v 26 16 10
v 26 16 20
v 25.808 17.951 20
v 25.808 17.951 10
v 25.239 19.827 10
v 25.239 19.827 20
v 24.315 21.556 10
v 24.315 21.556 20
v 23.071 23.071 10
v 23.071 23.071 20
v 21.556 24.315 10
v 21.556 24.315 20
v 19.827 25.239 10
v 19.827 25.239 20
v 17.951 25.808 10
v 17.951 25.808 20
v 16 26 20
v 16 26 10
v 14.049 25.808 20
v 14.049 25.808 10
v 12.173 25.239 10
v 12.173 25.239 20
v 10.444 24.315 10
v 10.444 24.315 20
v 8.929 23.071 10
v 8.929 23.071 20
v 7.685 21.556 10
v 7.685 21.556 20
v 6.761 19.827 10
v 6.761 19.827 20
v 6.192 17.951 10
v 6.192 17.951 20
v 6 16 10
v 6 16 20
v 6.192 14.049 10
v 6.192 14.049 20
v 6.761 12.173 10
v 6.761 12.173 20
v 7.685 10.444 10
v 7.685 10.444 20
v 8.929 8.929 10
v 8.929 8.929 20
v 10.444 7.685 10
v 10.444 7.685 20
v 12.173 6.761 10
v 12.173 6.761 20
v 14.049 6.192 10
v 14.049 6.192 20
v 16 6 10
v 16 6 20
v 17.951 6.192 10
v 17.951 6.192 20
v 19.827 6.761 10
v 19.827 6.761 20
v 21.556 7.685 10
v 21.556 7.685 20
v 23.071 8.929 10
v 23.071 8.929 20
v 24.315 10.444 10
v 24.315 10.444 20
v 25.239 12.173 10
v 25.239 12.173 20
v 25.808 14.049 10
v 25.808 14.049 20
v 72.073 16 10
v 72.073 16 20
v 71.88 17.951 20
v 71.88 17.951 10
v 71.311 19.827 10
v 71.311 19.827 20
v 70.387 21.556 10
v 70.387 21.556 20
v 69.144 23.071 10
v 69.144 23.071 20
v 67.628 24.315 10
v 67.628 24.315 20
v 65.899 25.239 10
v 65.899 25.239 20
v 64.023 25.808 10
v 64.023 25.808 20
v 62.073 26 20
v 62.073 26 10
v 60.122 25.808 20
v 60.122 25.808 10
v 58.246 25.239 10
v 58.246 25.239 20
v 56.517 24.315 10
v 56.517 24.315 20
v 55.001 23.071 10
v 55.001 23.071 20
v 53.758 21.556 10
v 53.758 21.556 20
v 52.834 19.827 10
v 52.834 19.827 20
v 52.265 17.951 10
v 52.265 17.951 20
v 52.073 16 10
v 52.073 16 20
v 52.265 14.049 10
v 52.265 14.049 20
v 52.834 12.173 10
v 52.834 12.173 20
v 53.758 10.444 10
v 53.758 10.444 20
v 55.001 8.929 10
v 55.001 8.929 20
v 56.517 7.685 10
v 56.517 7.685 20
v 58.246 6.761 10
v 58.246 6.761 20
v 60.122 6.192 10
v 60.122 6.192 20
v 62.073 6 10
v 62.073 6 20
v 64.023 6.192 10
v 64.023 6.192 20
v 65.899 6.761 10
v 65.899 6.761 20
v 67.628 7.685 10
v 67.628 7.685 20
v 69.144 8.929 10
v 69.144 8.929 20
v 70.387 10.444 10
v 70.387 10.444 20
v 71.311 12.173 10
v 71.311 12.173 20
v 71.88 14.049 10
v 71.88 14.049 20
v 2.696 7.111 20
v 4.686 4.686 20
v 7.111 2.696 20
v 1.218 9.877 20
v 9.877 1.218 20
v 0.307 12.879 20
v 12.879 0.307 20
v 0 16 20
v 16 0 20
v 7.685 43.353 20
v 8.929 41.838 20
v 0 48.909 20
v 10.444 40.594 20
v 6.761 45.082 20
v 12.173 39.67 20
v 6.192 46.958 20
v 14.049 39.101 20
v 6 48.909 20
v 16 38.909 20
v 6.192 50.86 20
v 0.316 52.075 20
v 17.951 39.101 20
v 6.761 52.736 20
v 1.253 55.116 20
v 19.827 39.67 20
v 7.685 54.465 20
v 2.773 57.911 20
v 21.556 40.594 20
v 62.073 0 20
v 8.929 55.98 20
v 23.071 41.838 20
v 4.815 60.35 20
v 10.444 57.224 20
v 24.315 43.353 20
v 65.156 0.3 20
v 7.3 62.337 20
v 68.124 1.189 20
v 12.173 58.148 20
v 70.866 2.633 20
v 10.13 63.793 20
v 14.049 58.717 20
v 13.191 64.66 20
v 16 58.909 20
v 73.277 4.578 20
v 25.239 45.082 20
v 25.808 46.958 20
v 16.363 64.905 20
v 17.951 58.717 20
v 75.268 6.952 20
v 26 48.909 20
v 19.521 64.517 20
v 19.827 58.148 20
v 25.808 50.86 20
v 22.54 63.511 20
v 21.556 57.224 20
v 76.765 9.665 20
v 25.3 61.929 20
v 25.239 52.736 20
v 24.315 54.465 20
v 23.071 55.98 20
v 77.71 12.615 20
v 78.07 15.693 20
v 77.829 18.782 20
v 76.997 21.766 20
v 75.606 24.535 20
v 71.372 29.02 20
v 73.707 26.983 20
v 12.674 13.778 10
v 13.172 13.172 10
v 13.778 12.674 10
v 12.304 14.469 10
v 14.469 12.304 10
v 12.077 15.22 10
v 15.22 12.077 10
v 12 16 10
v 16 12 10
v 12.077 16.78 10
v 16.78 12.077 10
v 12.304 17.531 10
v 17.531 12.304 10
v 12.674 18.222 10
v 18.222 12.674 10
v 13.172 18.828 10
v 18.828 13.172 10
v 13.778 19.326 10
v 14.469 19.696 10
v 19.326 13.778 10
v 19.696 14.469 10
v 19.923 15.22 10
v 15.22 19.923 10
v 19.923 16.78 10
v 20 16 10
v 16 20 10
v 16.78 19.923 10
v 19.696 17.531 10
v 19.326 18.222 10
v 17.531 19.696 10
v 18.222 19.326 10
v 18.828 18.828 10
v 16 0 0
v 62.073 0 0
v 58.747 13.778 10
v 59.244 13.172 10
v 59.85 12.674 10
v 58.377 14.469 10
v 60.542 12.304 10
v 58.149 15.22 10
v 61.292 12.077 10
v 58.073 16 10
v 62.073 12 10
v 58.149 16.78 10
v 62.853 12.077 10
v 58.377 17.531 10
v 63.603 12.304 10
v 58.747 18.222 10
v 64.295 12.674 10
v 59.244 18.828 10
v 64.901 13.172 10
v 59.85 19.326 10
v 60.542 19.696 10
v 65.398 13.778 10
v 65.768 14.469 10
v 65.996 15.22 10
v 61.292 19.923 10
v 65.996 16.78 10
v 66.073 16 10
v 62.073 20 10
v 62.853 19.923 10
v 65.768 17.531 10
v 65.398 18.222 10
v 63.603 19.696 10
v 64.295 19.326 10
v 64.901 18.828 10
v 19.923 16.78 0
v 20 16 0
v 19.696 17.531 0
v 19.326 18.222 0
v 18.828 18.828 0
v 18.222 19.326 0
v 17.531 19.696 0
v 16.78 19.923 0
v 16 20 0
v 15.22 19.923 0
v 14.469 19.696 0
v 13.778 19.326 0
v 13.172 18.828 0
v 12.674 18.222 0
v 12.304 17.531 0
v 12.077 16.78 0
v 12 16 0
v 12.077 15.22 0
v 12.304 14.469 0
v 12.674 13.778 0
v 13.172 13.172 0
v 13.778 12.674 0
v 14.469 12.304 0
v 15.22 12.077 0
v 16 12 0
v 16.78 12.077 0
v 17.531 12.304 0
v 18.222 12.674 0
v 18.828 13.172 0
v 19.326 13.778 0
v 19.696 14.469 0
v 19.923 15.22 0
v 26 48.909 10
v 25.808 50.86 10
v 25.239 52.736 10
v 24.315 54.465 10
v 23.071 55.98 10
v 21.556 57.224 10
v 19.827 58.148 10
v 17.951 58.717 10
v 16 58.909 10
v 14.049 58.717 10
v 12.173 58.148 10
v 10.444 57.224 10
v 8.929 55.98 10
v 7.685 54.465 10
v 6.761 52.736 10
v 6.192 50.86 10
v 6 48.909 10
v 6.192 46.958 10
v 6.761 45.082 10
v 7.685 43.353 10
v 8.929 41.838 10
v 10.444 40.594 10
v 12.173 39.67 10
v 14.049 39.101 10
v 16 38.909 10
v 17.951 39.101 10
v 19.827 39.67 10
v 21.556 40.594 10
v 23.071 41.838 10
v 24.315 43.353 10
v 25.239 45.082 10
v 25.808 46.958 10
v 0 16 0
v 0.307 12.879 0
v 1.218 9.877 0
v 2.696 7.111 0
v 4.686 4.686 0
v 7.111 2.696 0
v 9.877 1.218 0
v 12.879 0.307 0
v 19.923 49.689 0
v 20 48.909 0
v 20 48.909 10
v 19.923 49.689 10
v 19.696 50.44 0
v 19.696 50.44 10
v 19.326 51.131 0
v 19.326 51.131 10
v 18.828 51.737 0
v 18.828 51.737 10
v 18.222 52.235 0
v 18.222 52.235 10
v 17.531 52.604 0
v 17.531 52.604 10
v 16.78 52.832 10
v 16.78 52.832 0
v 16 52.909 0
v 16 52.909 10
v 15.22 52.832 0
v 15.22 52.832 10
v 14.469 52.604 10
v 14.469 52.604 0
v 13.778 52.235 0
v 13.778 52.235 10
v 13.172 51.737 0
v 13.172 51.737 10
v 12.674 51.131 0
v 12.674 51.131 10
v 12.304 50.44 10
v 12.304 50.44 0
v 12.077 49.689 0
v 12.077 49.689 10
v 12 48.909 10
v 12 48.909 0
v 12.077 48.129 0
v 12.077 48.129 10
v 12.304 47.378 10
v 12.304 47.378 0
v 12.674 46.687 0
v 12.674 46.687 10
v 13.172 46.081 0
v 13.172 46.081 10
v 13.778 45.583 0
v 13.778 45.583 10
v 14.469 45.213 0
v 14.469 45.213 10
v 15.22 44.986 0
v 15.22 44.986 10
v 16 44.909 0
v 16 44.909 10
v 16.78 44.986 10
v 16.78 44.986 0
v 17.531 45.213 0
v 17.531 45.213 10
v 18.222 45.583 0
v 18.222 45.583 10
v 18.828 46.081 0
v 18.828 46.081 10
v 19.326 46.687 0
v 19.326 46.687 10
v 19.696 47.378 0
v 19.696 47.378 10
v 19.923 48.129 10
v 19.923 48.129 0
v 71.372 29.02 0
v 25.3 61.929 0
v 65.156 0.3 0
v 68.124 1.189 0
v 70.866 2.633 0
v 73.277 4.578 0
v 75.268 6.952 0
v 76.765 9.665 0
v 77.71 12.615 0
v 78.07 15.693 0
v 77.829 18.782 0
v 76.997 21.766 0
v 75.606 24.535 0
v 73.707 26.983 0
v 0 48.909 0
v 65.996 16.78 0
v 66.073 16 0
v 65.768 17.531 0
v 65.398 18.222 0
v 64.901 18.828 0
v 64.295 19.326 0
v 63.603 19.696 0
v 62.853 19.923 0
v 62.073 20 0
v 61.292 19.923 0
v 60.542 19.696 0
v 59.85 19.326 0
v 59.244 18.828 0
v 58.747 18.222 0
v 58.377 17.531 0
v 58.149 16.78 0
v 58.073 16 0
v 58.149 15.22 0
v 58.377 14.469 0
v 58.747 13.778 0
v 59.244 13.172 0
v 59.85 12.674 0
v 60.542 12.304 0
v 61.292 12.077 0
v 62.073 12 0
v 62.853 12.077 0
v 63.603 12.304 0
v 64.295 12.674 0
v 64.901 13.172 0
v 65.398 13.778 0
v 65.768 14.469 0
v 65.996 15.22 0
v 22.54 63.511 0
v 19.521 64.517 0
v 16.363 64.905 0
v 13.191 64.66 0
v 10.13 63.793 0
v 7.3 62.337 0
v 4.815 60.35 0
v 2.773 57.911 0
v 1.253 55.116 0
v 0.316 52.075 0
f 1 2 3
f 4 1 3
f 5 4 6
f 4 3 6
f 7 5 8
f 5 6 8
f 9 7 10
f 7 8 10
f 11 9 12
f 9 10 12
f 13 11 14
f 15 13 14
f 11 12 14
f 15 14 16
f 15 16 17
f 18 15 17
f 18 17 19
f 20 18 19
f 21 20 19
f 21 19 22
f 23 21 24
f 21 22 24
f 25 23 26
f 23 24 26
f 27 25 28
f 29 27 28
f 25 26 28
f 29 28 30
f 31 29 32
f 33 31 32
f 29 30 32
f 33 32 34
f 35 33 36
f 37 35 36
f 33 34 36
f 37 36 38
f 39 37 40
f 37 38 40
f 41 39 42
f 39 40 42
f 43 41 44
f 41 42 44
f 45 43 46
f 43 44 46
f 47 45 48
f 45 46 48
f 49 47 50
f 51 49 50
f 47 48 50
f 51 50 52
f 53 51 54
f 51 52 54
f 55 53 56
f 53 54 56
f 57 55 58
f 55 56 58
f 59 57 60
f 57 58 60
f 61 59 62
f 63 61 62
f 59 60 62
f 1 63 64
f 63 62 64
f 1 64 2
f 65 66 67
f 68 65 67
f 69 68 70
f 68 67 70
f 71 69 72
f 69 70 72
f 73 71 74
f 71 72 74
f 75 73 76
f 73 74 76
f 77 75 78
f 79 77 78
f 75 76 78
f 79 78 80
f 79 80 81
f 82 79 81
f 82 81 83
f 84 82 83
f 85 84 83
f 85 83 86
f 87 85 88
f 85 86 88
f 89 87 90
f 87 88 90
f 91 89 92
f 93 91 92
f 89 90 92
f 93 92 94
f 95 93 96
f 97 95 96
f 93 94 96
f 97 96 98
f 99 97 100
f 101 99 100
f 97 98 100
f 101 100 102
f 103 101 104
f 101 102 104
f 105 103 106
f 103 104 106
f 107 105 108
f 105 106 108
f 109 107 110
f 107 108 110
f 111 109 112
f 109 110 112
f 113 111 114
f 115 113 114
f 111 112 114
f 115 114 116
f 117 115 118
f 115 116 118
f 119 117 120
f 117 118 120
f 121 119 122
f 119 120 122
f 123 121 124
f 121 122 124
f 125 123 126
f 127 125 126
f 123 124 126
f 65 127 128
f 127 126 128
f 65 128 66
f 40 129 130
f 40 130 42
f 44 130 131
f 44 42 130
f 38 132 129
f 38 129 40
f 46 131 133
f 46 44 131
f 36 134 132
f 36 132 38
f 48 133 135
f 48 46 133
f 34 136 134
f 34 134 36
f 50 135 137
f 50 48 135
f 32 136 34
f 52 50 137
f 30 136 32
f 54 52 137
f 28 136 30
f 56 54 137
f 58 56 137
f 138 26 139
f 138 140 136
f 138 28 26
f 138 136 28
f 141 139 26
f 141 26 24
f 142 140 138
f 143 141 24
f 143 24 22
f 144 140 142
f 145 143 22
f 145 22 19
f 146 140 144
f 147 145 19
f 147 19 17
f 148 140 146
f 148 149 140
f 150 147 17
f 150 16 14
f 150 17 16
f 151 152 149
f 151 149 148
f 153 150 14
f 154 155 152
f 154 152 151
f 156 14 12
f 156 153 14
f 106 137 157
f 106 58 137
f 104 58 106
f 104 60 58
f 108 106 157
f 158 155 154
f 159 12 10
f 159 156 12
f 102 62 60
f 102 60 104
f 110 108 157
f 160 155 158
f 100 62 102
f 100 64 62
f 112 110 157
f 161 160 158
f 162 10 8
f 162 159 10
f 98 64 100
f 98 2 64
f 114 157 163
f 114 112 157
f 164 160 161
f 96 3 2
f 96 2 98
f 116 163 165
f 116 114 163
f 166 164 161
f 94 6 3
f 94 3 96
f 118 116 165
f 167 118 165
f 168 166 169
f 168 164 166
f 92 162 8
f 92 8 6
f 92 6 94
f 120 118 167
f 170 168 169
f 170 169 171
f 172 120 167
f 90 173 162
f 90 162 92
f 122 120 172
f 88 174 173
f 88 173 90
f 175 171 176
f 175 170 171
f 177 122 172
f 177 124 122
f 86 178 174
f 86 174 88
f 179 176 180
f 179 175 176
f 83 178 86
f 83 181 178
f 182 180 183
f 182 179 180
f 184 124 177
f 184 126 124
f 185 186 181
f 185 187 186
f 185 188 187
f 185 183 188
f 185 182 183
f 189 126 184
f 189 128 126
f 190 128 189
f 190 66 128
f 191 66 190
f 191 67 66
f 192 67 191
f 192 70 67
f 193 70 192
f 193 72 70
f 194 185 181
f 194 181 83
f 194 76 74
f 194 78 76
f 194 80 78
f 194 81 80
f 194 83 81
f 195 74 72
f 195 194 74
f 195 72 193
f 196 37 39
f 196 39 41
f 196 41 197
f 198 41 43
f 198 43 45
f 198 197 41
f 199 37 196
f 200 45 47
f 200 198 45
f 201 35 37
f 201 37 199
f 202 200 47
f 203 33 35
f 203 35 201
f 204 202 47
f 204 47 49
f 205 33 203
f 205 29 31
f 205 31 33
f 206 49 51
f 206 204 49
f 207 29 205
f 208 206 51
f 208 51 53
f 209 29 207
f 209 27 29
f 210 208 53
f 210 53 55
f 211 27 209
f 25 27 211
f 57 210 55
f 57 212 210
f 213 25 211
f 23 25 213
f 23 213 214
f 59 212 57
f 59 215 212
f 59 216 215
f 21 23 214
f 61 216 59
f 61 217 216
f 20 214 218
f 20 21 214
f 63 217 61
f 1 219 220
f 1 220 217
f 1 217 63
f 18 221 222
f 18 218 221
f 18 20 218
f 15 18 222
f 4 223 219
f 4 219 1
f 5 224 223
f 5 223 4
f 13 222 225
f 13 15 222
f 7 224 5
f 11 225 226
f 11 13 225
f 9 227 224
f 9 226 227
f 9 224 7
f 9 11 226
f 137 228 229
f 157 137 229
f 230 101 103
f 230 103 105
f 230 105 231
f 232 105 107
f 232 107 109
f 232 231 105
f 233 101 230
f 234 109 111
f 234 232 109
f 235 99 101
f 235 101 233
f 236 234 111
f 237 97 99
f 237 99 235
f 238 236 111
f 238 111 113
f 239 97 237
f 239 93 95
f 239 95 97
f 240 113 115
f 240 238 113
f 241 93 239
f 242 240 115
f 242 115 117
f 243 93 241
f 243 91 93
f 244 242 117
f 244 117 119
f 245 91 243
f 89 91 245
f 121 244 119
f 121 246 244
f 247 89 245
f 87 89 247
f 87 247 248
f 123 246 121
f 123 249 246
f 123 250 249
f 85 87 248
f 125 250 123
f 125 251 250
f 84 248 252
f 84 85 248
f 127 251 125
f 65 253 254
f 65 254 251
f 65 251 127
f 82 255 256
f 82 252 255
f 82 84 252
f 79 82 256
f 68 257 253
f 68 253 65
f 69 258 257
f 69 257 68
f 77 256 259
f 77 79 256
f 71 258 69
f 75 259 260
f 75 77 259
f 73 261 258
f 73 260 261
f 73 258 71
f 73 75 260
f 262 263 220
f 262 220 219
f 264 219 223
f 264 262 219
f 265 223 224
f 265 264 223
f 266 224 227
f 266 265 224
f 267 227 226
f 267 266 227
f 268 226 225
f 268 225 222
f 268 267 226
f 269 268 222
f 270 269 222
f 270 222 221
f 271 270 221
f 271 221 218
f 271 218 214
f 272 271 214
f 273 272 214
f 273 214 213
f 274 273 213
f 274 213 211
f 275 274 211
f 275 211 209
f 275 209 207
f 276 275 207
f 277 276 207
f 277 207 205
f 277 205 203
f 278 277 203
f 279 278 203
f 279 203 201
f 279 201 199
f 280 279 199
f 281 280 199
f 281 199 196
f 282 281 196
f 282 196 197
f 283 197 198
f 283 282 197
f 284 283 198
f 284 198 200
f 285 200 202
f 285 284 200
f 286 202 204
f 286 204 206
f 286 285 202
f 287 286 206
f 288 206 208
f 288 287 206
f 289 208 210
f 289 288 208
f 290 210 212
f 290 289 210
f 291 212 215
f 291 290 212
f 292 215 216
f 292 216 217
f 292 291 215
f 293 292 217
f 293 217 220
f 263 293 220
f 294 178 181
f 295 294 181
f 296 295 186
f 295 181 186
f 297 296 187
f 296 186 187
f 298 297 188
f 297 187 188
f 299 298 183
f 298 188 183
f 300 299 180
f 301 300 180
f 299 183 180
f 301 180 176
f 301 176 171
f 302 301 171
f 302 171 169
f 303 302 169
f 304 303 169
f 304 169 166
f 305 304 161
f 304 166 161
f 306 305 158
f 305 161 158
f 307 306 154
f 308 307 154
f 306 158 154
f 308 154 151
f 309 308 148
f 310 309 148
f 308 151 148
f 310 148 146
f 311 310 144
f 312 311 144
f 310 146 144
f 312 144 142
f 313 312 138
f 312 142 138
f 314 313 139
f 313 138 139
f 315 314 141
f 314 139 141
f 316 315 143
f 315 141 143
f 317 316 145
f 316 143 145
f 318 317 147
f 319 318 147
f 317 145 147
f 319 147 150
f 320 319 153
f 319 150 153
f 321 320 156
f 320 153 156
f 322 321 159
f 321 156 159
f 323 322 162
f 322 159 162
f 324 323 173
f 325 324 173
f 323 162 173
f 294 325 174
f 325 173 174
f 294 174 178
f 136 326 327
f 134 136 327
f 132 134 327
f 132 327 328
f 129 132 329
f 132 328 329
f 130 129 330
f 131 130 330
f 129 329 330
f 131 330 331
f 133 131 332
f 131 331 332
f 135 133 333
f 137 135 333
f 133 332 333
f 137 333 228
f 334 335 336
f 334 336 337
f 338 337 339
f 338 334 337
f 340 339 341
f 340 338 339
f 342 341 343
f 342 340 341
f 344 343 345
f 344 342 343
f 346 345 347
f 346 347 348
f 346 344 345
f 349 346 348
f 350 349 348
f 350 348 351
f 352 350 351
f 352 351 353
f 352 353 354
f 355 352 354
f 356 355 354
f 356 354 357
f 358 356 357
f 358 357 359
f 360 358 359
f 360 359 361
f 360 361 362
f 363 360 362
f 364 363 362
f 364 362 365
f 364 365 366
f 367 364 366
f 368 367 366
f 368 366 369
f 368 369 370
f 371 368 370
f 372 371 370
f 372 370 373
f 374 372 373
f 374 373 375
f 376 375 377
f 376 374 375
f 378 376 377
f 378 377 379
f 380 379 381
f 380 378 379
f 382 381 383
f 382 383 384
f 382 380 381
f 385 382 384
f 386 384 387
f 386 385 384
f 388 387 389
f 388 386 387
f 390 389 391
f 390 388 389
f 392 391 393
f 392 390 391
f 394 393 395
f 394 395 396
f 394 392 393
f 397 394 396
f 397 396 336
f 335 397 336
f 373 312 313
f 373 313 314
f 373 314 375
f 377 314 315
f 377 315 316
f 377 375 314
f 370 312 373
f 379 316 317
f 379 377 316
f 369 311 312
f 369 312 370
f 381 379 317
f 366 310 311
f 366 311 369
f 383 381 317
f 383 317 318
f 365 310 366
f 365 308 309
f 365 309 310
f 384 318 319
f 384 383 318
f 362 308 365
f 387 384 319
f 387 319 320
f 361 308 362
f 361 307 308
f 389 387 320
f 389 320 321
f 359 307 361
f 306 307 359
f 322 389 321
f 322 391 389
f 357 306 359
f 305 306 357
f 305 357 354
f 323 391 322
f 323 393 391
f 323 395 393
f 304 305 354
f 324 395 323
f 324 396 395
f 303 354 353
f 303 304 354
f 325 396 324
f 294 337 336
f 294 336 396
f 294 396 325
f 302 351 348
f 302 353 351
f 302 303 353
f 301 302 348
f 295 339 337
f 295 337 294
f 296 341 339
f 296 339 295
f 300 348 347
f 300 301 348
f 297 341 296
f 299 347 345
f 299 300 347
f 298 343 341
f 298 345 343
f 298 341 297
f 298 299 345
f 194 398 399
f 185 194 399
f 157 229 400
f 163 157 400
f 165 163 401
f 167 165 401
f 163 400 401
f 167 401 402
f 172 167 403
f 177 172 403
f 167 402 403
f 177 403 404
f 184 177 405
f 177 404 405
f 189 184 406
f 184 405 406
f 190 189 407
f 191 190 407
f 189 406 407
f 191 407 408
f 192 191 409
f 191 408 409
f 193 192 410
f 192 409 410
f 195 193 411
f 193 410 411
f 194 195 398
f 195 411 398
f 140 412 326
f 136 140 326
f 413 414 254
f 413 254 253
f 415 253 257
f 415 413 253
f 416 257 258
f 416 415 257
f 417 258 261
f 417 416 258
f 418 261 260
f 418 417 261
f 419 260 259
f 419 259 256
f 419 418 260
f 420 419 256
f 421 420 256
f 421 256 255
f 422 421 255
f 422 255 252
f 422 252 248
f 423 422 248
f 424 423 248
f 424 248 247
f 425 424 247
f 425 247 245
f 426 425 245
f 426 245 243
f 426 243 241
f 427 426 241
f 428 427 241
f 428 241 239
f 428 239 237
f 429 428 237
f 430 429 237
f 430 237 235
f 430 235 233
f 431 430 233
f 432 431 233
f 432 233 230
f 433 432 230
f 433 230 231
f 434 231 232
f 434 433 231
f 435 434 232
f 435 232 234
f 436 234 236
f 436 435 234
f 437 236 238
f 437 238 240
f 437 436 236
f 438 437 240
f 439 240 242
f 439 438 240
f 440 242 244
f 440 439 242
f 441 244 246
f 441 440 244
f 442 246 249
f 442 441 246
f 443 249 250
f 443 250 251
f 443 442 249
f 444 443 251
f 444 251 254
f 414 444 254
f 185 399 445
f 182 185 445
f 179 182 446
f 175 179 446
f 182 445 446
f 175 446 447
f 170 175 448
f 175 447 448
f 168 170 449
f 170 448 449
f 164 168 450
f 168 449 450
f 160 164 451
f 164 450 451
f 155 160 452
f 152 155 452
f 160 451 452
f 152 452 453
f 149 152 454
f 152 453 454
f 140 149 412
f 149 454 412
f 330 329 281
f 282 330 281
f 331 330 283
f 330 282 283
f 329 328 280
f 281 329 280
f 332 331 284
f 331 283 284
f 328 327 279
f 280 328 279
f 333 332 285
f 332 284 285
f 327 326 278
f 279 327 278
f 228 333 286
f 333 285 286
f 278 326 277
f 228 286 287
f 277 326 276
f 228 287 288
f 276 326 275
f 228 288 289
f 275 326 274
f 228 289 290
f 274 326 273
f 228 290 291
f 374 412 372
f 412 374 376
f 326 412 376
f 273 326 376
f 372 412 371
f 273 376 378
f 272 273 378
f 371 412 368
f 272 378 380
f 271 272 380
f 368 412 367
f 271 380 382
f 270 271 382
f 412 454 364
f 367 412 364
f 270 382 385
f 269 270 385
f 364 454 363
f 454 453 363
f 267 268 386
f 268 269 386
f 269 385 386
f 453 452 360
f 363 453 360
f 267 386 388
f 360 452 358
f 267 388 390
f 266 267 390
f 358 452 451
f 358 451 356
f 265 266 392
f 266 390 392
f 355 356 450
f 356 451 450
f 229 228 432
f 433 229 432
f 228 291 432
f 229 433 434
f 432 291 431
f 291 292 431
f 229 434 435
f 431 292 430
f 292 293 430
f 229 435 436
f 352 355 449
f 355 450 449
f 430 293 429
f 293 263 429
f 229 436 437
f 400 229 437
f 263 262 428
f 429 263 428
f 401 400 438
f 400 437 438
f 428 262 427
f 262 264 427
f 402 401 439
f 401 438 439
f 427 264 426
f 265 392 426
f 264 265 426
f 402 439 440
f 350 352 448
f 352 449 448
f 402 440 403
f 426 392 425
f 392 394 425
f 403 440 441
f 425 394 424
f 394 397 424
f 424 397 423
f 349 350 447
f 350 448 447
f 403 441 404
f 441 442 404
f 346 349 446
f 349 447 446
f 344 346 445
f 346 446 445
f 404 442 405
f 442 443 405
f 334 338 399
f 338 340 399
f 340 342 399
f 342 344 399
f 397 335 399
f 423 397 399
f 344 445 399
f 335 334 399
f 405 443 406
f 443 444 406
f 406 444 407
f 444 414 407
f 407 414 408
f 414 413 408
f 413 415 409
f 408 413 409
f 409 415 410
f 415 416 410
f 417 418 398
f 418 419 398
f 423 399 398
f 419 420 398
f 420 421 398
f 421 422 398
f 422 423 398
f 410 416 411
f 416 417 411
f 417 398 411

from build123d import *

# Parameters (mm, degrees)
F0_R     = 10
F0_R_2   = 4
F1_DEPTH = 20
F2_R     = 10
F2_R_2   = 4
F3_DEPTH = 10


with BuildPart() as f1:
    # F0 (on Top) → F1 (new body)
    with BuildSketch(Plane.XY):
        with BuildLine():
            ThreePointArc((0, 16), (4.686292, 4.686292), (16, 0))
            Line((16, 0), (62.072559, 0))
            ThreePointArc((62.072559, 0), (77.309287, 11.117161), (71.37237, 29.019736))
            Line((71.37237, 29.019736), (25.299811, 61.928706))
            ThreePointArc((25.299811, 61.928706), (8.678695, 63.135653), (0, 48.908971))
            Line((0, 48.908971), (0, 16))
        make_face()
        with Locations((16, 16)):
            Circle(F0_R, mode=Mode.SUBTRACT)
        with Locations((62.072559, 16)):
            Circle(F0_R, mode=Mode.SUBTRACT)
        with Locations((16, 48.908971)):
            Circle(F0_R, mode=Mode.SUBTRACT)
        with Locations((16, 48.908971)):
            Circle(F0_R)
        with Locations((16, 48.908971)):
            Circle(F0_R_2, mode=Mode.SUBTRACT)
        with Locations((62.072559, 16)):
            Circle(F0_R)
        with Locations((62.072559, 16)):
            Circle(F0_R_2, mode=Mode.SUBTRACT)
        with Locations((16, 16)):
            Circle(F0_R)
        with Locations((16, 16)):
            Circle(F0_R_2, mode=Mode.SUBTRACT)
    extrude(amount=F1_DEPTH)

    # F2 (on face) → F3 (cut)
    with BuildSketch(Plane.XY.offset(20)):
        with Locations((16, 48.908971)):
            Circle(F2_R)
        with Locations((16, 48.908971)):
            Circle(F2_R_2, mode=Mode.SUBTRACT)
        with Locations((16, 16)):
            Circle(F2_R)
        with Locations((16, 16)):
            Circle(F2_R_2, mode=Mode.SUBTRACT)
        with Locations((62.072559, 16)):
            Circle(F2_R)
        with Locations((62.072559, 16)):
            Circle(F2_R_2, mode=Mode.SUBTRACT)
    extrude(amount=-F3_DEPTH, mode=Mode.SUBTRACT)


solid = f1.part
